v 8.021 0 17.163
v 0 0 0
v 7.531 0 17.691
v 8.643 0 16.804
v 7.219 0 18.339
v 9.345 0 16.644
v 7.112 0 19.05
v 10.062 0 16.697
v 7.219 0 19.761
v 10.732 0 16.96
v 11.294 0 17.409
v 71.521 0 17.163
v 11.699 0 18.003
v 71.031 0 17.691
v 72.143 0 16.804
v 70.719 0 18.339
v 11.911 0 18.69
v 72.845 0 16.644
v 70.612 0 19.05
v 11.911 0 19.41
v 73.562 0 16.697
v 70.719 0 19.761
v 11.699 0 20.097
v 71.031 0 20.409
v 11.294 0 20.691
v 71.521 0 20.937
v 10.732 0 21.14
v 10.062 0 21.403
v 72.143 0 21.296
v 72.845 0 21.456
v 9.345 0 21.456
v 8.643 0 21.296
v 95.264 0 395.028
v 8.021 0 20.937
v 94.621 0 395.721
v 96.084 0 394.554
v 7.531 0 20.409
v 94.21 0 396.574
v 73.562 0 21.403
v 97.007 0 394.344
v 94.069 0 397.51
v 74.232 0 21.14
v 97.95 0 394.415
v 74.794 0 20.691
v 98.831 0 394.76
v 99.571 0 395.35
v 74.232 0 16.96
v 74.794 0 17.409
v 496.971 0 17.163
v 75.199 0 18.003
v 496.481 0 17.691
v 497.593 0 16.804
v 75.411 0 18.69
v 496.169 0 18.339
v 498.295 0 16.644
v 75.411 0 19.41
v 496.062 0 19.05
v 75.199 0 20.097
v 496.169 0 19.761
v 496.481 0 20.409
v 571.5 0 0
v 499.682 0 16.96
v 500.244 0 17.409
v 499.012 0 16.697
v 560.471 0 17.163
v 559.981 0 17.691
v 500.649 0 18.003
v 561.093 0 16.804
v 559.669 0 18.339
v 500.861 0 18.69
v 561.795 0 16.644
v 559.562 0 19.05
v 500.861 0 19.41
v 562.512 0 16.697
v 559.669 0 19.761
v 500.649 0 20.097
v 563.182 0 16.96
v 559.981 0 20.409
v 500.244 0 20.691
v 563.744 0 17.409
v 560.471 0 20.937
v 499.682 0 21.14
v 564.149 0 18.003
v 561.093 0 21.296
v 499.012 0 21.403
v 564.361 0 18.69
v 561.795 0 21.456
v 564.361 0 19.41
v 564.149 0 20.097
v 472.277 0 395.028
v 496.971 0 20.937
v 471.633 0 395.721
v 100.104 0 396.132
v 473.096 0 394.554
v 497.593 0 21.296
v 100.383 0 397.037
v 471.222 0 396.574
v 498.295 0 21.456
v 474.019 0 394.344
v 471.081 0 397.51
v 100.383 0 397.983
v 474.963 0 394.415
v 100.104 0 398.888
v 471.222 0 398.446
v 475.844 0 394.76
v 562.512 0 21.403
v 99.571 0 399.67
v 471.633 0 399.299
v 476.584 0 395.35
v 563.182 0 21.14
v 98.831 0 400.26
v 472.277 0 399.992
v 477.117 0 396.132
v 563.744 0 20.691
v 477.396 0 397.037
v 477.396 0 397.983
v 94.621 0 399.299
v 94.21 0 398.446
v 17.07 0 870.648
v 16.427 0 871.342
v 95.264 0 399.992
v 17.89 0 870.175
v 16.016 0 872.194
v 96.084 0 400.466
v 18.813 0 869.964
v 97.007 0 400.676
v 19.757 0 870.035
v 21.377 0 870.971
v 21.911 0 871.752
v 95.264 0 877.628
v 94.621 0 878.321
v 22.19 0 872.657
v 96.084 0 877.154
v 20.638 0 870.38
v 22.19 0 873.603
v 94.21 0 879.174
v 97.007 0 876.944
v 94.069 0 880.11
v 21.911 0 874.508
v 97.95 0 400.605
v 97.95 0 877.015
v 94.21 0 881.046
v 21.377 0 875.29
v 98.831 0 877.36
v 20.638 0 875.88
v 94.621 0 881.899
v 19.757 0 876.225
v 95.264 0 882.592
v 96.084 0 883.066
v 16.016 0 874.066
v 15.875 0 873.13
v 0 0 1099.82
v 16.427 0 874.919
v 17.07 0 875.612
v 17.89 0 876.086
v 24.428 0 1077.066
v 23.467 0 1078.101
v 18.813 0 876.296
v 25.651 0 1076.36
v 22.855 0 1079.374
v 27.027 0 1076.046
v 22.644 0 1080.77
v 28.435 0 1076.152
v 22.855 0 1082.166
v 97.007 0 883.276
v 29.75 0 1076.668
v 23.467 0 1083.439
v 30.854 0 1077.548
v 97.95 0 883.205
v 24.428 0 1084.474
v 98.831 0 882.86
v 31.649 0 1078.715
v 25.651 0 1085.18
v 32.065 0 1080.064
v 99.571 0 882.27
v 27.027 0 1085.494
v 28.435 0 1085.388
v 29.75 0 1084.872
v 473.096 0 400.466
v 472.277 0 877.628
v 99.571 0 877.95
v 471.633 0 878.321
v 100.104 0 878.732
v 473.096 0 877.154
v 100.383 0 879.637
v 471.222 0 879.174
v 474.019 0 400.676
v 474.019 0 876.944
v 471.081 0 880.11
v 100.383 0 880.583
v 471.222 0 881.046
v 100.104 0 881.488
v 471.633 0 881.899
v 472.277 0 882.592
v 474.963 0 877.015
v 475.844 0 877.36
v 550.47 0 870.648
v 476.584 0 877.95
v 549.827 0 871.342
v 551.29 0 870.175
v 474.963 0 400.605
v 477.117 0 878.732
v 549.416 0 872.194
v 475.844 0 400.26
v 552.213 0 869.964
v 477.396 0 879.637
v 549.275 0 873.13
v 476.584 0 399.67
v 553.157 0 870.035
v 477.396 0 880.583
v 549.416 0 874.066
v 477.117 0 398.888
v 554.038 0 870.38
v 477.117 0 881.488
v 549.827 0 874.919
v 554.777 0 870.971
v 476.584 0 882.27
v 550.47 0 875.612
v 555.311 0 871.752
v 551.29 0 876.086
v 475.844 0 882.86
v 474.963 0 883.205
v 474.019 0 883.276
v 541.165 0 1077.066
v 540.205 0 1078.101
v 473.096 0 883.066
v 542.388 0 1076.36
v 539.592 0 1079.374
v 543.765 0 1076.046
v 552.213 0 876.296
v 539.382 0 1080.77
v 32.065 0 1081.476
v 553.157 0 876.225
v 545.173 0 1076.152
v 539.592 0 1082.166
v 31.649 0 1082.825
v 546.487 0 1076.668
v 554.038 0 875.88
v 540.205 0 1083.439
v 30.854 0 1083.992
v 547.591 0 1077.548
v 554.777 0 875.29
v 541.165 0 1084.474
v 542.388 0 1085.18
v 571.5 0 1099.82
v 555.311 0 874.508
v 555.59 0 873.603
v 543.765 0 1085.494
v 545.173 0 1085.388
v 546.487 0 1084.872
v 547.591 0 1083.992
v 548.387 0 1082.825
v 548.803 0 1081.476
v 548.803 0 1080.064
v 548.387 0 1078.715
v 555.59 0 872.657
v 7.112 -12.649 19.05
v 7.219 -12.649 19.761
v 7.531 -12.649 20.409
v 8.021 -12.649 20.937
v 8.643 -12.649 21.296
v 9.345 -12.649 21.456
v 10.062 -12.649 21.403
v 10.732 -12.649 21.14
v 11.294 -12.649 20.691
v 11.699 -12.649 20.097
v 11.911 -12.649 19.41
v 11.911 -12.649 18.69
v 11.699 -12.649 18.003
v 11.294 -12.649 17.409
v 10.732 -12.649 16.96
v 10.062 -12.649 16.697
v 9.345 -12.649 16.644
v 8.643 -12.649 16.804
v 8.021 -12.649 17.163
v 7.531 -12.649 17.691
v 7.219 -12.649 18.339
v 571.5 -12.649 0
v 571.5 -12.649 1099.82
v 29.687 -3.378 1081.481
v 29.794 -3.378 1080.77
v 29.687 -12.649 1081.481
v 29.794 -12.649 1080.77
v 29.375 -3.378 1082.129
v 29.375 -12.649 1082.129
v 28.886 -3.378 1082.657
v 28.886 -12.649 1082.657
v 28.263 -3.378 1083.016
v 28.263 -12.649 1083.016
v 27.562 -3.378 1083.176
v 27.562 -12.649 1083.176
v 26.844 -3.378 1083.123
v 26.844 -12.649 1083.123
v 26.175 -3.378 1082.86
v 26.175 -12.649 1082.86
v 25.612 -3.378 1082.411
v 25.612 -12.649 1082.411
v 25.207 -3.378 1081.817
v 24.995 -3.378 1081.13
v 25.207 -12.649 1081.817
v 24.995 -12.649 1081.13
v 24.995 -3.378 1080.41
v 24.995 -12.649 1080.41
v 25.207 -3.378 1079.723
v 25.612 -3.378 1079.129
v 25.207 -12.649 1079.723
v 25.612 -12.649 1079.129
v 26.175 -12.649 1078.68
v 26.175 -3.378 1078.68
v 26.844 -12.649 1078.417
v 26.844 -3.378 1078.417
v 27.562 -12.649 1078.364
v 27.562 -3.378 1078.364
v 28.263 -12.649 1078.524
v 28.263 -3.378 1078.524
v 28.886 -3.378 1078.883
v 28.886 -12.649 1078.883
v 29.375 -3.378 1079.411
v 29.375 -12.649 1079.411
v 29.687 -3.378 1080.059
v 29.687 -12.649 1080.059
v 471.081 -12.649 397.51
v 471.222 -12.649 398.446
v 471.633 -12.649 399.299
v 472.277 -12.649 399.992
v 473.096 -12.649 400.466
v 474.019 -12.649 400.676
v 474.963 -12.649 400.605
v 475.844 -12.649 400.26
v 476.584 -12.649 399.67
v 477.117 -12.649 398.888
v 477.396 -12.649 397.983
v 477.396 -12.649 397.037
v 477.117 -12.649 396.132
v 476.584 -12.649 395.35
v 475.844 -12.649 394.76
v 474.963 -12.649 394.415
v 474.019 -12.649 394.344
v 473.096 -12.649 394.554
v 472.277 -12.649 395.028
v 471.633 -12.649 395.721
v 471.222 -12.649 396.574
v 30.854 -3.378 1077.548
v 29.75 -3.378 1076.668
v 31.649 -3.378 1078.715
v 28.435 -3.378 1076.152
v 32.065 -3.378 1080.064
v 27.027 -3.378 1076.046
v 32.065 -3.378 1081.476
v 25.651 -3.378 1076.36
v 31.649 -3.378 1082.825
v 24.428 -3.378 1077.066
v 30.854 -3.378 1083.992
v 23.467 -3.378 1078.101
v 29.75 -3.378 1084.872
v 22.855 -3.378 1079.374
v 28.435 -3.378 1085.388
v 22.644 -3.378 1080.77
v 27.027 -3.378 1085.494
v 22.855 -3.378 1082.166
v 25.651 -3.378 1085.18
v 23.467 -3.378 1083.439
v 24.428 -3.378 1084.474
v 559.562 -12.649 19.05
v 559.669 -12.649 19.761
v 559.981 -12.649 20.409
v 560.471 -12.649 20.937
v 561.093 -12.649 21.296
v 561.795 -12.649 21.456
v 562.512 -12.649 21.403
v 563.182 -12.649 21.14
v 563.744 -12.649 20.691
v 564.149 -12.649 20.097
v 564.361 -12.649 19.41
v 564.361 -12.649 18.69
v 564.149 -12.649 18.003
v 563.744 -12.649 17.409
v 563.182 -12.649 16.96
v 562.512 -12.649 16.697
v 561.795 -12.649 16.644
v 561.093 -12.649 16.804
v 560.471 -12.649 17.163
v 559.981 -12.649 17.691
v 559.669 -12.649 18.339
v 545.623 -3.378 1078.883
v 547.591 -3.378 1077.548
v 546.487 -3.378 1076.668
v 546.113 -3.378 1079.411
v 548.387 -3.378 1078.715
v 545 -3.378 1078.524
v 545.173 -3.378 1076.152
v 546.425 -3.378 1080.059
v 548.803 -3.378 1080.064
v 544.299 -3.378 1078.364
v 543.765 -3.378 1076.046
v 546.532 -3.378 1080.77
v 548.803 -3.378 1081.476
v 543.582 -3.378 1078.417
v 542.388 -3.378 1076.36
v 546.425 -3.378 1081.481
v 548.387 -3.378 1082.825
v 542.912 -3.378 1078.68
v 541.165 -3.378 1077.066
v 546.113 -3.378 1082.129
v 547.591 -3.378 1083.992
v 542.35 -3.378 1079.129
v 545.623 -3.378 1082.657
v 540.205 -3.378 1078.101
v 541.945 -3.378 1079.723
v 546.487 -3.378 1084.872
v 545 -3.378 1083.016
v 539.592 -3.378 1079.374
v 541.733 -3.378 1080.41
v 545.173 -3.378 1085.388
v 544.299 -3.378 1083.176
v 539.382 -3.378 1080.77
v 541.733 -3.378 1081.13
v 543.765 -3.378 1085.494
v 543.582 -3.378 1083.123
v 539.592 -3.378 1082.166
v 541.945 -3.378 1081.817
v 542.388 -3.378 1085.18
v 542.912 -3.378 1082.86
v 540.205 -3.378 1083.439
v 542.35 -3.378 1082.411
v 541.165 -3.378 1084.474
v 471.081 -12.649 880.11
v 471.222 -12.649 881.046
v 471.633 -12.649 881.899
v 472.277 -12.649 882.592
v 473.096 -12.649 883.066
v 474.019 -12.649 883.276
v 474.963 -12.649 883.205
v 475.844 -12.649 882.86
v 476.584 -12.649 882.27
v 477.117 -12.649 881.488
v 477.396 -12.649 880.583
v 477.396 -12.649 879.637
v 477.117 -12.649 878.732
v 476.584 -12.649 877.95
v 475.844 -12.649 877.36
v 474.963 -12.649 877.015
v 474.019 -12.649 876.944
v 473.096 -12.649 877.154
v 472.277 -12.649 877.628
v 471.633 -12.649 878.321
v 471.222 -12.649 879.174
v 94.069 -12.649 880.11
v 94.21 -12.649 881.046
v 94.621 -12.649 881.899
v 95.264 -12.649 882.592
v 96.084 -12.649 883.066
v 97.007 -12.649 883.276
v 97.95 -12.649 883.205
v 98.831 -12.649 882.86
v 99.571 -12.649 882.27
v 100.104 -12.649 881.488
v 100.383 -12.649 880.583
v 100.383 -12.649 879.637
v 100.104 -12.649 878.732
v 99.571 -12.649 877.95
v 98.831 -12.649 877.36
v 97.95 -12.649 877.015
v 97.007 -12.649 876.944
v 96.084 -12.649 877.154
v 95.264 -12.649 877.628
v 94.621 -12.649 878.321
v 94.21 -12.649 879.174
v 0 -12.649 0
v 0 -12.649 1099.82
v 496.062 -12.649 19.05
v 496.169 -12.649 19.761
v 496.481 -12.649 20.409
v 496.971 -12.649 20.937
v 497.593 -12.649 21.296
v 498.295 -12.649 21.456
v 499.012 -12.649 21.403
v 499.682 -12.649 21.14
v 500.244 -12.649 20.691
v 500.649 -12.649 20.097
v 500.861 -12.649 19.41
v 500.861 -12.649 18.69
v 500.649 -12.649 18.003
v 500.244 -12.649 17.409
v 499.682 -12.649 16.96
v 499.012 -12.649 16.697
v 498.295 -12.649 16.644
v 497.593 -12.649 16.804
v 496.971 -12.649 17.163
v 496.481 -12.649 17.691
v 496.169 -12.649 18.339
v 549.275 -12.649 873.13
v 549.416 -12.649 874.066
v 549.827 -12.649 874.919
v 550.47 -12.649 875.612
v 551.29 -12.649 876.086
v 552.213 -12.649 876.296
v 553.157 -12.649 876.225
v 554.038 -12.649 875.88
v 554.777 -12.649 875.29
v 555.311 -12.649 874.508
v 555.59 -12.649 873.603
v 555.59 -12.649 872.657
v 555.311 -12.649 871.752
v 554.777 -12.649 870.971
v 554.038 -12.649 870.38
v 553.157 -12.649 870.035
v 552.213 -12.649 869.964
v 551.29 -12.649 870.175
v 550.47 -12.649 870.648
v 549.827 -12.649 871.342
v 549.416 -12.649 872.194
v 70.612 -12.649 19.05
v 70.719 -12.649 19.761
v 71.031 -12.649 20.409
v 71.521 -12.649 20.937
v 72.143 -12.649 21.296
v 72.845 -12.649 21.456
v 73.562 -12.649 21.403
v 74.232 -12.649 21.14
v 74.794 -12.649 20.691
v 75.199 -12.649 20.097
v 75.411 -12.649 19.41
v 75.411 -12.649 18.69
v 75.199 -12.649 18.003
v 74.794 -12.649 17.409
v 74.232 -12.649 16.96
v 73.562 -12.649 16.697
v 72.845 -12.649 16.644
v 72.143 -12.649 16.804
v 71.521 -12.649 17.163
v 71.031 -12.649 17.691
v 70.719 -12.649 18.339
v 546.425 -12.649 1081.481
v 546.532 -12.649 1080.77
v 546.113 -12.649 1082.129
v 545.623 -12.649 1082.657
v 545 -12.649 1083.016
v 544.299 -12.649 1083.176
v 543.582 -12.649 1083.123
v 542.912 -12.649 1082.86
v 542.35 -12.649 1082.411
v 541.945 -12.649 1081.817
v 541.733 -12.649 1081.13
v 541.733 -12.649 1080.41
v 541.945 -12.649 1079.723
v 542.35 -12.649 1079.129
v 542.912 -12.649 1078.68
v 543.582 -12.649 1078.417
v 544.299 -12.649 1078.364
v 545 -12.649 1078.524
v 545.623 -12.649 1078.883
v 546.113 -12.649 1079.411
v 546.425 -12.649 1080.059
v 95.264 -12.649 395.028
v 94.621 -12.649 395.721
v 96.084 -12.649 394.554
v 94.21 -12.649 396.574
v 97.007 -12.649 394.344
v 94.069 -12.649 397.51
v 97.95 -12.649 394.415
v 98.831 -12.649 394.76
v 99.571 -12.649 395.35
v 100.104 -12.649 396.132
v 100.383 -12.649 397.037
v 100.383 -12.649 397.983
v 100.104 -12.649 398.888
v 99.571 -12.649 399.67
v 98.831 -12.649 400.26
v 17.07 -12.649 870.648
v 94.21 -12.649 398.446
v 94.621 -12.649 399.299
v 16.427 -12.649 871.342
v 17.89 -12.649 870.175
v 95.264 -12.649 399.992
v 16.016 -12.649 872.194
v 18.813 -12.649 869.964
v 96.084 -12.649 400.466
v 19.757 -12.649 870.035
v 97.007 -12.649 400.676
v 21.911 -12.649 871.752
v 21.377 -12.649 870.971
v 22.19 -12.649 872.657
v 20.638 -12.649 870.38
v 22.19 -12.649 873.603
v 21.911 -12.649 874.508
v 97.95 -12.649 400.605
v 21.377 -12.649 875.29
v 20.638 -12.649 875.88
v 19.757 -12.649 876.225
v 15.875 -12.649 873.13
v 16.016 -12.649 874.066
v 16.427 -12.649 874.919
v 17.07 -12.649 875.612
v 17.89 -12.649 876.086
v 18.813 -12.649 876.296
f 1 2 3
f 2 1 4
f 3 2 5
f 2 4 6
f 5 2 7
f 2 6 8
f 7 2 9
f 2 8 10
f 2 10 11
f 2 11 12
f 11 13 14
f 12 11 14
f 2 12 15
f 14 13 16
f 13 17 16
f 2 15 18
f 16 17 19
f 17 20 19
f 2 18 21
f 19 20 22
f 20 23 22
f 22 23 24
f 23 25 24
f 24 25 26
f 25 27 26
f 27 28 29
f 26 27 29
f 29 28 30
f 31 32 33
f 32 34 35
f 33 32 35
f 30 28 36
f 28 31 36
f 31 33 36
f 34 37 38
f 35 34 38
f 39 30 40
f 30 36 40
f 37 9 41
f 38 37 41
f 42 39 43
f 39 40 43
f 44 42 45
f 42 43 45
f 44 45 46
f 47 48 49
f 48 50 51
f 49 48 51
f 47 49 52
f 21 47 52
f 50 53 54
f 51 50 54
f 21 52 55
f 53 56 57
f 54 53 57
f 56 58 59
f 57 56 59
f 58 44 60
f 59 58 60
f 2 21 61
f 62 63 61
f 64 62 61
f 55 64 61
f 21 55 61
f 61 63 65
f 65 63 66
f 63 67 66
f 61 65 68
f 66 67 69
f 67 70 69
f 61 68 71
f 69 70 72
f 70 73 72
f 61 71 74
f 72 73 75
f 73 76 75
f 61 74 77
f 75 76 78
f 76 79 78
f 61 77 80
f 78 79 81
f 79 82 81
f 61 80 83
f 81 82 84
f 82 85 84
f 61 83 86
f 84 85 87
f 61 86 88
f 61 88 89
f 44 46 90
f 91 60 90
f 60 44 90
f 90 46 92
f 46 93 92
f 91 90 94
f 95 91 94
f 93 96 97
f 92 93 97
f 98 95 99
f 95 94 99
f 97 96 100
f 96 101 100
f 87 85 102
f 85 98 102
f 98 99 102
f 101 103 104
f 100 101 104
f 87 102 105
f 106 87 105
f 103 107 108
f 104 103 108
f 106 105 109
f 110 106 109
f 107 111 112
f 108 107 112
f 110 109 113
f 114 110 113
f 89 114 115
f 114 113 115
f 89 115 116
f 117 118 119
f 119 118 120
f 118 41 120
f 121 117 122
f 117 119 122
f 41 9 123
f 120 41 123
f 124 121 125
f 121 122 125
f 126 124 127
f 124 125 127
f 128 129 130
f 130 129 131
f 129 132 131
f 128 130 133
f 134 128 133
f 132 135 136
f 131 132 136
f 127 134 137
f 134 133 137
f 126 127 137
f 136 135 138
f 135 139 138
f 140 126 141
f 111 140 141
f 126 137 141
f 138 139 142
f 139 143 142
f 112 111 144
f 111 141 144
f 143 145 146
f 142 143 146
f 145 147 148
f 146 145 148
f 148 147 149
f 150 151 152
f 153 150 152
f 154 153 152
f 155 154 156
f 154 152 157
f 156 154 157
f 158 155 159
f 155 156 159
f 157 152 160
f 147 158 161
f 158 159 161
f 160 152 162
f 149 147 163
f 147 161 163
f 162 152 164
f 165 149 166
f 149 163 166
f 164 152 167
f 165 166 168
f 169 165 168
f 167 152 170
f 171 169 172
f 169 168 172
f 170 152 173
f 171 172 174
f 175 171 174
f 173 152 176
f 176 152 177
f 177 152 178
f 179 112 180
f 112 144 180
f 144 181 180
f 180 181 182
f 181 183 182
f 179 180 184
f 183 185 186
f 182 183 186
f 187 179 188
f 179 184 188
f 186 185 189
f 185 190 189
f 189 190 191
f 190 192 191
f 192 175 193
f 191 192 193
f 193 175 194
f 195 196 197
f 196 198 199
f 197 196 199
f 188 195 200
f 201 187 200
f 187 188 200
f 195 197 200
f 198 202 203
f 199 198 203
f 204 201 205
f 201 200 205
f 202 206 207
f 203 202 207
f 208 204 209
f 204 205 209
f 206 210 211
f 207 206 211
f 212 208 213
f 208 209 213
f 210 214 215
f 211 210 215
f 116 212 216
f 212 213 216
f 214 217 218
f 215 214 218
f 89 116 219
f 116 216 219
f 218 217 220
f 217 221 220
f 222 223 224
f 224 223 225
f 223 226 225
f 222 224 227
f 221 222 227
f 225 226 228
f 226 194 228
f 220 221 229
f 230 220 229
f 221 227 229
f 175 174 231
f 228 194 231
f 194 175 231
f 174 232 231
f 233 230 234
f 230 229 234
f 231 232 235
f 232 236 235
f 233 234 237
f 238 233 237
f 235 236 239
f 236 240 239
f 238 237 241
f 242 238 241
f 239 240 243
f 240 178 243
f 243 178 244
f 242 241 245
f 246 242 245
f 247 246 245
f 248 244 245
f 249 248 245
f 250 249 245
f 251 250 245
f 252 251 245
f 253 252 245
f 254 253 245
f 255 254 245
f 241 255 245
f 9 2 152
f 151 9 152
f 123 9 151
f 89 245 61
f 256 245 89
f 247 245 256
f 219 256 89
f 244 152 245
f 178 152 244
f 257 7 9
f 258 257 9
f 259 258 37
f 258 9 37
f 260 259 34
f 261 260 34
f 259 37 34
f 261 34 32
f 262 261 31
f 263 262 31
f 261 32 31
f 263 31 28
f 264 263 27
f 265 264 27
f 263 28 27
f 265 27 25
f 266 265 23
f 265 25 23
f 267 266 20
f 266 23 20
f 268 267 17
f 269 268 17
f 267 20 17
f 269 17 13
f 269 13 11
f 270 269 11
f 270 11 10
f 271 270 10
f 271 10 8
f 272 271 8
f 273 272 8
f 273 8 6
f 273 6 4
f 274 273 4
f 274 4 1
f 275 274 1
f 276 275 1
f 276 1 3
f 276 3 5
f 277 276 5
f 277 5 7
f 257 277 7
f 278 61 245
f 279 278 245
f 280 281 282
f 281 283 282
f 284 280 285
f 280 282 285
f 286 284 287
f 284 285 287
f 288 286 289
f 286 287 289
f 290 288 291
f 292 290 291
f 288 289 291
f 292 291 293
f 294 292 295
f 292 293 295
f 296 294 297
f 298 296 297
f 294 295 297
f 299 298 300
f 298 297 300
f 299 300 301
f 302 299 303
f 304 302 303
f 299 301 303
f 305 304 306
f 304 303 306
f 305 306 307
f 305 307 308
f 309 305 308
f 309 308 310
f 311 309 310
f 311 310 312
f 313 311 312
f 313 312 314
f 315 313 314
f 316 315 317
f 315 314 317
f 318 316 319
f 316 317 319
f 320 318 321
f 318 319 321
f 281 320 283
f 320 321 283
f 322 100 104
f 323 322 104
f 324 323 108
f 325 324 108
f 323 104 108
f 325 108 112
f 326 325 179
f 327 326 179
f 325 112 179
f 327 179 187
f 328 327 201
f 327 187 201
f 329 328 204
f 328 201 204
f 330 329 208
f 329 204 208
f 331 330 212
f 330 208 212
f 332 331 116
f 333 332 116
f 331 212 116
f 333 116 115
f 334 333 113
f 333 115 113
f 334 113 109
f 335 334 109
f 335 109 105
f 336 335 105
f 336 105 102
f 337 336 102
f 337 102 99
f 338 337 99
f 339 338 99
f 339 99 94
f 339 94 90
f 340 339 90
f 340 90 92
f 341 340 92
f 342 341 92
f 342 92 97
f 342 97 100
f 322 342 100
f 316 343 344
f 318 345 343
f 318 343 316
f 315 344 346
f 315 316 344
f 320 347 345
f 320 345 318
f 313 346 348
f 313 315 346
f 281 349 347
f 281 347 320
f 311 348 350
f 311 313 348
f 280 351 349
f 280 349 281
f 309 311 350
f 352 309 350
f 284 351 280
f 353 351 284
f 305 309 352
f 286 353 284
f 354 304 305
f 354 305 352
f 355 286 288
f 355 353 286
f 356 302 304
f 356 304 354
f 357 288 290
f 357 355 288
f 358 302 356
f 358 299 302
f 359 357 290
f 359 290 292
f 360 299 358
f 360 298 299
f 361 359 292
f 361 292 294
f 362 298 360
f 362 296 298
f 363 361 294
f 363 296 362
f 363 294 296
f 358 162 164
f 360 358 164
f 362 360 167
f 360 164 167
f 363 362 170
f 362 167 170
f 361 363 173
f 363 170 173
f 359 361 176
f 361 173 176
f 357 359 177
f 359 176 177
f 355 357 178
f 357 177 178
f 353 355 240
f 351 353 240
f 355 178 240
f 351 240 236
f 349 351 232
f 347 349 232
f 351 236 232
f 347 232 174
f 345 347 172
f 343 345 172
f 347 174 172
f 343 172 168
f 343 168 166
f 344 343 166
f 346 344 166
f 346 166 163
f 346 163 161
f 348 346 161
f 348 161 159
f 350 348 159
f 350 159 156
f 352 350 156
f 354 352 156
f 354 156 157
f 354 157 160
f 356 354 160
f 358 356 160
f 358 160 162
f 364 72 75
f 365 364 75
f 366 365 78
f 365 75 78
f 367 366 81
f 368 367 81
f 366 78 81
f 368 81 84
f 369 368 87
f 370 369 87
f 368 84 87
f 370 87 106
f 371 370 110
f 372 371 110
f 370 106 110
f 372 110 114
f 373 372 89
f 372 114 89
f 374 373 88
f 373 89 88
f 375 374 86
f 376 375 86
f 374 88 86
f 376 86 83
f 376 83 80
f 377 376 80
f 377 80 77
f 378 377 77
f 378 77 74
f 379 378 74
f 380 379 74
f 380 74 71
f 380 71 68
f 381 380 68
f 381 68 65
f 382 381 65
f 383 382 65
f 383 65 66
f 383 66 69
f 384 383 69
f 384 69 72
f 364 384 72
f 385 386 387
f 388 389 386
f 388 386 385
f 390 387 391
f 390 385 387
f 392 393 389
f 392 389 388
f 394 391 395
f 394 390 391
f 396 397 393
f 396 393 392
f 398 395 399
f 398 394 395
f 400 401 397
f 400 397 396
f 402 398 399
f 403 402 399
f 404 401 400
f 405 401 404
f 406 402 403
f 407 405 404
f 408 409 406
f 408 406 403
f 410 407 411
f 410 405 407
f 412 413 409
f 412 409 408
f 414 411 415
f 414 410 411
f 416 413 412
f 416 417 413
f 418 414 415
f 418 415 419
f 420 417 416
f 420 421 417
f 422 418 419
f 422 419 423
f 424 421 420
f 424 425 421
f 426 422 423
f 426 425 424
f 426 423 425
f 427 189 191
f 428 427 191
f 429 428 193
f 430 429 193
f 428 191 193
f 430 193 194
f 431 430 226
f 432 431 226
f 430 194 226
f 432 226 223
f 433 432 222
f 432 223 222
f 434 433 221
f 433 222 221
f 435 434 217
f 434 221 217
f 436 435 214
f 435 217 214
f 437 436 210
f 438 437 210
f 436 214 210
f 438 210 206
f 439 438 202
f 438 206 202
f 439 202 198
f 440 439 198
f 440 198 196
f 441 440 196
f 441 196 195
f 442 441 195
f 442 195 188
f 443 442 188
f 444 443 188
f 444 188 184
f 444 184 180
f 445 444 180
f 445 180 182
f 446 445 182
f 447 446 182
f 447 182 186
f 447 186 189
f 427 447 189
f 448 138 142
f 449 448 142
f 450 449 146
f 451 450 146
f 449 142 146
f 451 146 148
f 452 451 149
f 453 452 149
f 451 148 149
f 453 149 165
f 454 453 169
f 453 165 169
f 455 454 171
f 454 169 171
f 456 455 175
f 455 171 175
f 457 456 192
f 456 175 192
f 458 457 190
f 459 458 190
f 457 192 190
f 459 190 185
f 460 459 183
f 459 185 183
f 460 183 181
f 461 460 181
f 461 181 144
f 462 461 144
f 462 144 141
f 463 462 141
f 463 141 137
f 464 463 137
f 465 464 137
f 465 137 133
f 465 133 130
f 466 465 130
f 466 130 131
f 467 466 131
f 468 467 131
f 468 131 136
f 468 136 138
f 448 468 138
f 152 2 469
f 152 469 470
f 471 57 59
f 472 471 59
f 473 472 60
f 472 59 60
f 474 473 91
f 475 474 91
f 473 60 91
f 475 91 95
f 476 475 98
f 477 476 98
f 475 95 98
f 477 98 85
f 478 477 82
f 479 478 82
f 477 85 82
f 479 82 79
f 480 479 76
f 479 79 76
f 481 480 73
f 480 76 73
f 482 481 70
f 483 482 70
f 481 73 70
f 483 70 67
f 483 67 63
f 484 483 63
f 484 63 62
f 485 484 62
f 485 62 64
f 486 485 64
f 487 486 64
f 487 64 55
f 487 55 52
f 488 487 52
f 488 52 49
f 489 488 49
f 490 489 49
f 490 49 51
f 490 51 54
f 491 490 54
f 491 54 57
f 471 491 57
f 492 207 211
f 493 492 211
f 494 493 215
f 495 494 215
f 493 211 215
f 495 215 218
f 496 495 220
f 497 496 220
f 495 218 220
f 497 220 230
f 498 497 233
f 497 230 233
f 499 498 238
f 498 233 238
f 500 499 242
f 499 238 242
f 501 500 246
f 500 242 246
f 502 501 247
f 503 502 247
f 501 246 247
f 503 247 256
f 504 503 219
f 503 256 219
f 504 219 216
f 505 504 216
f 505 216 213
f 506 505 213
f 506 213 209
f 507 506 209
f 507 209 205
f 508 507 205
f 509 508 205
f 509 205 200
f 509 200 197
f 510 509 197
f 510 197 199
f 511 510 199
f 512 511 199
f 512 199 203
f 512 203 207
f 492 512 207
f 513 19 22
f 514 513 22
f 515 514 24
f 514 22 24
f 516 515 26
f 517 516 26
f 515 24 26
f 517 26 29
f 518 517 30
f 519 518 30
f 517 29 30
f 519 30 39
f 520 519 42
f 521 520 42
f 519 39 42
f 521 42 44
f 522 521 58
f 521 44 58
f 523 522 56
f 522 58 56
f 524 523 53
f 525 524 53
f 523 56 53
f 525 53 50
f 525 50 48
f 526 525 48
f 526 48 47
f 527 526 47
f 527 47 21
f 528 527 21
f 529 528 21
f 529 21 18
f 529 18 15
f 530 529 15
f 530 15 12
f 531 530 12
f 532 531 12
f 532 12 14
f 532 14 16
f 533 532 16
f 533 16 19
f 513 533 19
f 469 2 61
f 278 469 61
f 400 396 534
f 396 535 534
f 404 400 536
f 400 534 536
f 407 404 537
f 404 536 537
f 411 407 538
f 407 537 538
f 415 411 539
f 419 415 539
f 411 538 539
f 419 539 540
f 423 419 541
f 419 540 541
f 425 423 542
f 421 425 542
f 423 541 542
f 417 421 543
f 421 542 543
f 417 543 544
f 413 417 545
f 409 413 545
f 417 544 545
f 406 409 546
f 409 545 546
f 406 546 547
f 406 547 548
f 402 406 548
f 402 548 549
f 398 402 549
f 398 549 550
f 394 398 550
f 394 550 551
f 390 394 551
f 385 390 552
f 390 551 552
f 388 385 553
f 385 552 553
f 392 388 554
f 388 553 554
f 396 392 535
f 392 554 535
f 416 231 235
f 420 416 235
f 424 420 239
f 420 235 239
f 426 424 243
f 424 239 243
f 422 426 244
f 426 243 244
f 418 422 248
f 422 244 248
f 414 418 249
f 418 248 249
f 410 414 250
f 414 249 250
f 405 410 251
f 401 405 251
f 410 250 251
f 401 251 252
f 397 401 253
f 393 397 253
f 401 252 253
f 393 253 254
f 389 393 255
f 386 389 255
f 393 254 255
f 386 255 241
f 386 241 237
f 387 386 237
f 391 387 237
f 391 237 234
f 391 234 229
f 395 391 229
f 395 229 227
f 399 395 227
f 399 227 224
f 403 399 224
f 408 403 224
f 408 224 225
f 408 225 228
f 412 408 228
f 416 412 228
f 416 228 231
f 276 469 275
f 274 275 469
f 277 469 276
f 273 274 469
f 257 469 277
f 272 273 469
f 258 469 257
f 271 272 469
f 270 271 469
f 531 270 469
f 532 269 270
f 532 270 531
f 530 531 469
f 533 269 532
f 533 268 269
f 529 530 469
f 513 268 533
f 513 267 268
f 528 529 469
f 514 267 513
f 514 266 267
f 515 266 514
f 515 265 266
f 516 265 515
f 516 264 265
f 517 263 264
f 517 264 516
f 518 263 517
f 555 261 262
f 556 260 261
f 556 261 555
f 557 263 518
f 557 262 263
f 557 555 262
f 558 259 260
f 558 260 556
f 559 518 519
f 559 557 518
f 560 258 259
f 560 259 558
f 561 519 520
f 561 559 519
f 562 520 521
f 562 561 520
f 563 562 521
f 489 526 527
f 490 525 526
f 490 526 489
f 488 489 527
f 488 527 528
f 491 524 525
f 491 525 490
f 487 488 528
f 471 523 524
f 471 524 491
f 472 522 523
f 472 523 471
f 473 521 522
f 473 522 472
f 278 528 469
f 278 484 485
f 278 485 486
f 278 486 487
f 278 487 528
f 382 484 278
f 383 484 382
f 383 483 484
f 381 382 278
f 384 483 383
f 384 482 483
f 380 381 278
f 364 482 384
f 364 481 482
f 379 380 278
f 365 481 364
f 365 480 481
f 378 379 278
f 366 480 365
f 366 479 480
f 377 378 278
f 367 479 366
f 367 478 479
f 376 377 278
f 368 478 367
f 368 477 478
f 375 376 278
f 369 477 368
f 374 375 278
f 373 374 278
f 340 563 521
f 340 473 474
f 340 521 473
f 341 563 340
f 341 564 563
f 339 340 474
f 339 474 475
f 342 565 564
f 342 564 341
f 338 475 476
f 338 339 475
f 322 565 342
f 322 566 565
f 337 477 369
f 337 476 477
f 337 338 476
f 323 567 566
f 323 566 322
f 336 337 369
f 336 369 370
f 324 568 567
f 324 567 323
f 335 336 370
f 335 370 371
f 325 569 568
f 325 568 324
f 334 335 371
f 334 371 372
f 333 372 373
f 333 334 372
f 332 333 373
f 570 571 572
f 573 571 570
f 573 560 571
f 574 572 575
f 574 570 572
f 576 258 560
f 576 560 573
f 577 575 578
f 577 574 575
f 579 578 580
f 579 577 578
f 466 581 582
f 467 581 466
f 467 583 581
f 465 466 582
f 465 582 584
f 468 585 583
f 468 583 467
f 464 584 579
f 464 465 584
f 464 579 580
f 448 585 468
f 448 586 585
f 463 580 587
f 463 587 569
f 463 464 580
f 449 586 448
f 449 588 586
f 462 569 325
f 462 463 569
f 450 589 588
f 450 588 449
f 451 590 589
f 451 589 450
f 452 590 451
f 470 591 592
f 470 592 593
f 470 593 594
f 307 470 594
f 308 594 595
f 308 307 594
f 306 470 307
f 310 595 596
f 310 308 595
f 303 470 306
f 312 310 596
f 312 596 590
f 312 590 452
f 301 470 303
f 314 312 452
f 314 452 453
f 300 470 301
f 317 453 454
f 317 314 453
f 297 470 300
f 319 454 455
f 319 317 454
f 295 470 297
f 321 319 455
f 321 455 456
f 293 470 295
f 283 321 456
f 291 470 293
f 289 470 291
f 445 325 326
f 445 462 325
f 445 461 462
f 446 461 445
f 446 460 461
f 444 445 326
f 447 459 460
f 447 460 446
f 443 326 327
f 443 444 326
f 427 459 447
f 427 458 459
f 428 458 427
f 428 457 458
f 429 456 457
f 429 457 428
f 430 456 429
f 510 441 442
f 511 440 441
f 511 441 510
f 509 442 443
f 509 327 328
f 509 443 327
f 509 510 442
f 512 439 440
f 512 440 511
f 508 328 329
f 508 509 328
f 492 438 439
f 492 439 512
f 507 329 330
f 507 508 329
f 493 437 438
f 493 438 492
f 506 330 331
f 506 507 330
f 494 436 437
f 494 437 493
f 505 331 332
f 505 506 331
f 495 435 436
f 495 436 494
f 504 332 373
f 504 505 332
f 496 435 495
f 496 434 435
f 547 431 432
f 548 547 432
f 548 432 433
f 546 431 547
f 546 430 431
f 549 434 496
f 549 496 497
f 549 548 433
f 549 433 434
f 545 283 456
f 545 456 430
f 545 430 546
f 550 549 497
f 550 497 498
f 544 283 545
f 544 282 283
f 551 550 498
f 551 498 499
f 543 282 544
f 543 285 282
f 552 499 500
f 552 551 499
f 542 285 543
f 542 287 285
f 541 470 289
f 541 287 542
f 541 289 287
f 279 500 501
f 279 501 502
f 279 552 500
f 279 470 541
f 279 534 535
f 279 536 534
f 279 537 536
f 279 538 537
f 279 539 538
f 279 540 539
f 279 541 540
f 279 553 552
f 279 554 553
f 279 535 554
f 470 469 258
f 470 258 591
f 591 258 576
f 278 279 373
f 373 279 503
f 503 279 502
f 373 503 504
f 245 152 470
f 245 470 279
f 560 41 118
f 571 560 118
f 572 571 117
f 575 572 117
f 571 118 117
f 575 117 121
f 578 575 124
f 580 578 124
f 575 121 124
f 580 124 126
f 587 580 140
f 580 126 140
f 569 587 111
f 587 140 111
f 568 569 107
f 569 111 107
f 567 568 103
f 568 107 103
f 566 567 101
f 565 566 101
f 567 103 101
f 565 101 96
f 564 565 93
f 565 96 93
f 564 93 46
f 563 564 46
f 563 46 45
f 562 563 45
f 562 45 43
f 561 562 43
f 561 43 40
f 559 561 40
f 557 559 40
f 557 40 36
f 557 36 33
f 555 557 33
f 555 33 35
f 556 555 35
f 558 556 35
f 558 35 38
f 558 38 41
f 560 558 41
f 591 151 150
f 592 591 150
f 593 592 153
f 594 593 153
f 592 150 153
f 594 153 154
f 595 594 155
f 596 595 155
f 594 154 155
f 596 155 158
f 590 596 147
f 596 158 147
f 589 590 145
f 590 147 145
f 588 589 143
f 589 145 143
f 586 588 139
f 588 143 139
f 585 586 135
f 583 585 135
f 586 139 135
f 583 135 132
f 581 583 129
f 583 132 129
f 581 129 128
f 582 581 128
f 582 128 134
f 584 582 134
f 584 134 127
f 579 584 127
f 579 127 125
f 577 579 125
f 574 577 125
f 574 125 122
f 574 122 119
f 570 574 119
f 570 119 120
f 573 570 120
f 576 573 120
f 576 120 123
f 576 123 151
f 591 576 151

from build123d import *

# Parameters (mm, degrees)
F0_W           = 571.5
F0_H           = 1099.82
F1_DEPTH       = 12.6492
F3_D           = 4.826
F3_DEPTH       = 12.7
F4_D           = 6.35
F6_D           = 4.826
F6_DEPTH       = 12.7
F6_CBORE_D     = 9.4742
F6_CBORE_DEPTH = 3.3782


with BuildPart() as f1:
    # F0 (on Front) → F1 (new body)
    with BuildSketch(Plane.XZ):
        with Locations((285.75, 549.91)):
            Rectangle(F0_W, F0_H)
    extrude(amount=F1_DEPTH)

    # F3
    with Locations(Plane.XZ.offset(12.6492)):
        with Locations((9.525, 19.05), (73.025, 19.05), (498.475, 19.05), (561.975, 19.05)):
            Hole(F3_D / 2, depth=F3_DEPTH)

    # F4 (through all)
    with Locations(Plane.XZ.offset(12.6492)):
        with Locations((97.2439, 880.11), (474.2561, 880.11), (97.2439, 397.51), (474.2561, 397.51), (19.05, 873.13008), (552.45, 873.13008)):
            Hole(F4_D / 2)

    # F6
    with Locations(Plane(origin=(0, 0, 0), x_dir=(-1, 0, 0), z_dir=(0, 1, 0))):
        with Locations((-544.1188, 1080.77), (-27.3812, 1080.77)):
            CounterBoreHole(F6_D / 2, F6_CBORE_D / 2, F6_CBORE_DEPTH, depth=F6_DEPTH)


solid = f1.part
